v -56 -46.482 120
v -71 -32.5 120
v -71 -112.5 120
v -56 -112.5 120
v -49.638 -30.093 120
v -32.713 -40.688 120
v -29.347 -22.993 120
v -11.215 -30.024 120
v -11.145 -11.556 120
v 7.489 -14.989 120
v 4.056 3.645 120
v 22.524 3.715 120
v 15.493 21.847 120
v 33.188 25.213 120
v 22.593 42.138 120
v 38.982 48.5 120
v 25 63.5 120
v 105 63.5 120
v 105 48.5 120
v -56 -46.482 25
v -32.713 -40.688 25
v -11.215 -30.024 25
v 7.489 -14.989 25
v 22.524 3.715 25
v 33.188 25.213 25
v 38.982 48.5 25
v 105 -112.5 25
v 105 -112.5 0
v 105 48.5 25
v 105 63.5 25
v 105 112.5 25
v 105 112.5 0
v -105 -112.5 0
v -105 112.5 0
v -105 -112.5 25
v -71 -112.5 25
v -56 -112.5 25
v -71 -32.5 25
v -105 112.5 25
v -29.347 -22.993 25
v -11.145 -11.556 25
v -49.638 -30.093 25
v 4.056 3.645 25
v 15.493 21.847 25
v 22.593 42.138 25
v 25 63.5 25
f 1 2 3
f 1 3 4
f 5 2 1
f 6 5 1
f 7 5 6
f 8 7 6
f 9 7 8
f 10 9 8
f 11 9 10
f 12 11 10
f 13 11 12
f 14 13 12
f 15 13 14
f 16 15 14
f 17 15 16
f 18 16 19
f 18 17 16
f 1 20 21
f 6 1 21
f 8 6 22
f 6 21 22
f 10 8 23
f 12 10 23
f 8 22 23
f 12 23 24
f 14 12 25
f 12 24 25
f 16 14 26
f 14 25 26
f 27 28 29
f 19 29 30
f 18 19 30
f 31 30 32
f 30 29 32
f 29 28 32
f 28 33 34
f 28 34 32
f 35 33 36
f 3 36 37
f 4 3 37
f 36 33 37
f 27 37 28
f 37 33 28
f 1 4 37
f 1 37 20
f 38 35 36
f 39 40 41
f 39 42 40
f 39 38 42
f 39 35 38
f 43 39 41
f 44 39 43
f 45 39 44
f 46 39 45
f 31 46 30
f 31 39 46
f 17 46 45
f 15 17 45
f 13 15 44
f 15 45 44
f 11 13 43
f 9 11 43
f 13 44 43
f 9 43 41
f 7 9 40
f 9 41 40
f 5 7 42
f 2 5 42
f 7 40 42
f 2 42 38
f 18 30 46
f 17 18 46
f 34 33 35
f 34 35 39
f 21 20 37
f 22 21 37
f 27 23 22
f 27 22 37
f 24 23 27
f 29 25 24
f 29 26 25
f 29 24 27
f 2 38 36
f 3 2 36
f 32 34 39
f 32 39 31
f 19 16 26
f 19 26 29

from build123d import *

# Parameters (mm, degrees)
F0_W     = 210
F0_H     = 225
F1_DEPTH = 25
F3_DEPTH = 95


with BuildPart() as f1:
    # F0 (on Top) → F1 (new body)
    with BuildSketch(Plane.XY):
        Rectangle(F0_W, F0_H)
    extrude(amount=F1_DEPTH)

    # F2 (on face) → F3 (join)
    with BuildSketch(Plane.XY.offset(25)):
        with BuildLine():
            Line((-71, -32.5), (-71, -112.5))
            Line((-71, -112.5), (-56, -112.5))
            Line((-56, -112.5), (-56, -46.481817))
            ThreePointArc((-56, -46.481817), (7.488853, -14.988853), (38.981817, 48.5))
            Line((38.981817, 48.5), (105, 48.5))
            Line((105, 48.5), (105, 63.5))
            Line((105, 63.5), (25, 63.5))
            ThreePointArc((25, 63.5), (-3.117749, -4.382251), (-71, -32.5))
        make_face()
    extrude(amount=F3_DEPTH)


solid = f1.part
